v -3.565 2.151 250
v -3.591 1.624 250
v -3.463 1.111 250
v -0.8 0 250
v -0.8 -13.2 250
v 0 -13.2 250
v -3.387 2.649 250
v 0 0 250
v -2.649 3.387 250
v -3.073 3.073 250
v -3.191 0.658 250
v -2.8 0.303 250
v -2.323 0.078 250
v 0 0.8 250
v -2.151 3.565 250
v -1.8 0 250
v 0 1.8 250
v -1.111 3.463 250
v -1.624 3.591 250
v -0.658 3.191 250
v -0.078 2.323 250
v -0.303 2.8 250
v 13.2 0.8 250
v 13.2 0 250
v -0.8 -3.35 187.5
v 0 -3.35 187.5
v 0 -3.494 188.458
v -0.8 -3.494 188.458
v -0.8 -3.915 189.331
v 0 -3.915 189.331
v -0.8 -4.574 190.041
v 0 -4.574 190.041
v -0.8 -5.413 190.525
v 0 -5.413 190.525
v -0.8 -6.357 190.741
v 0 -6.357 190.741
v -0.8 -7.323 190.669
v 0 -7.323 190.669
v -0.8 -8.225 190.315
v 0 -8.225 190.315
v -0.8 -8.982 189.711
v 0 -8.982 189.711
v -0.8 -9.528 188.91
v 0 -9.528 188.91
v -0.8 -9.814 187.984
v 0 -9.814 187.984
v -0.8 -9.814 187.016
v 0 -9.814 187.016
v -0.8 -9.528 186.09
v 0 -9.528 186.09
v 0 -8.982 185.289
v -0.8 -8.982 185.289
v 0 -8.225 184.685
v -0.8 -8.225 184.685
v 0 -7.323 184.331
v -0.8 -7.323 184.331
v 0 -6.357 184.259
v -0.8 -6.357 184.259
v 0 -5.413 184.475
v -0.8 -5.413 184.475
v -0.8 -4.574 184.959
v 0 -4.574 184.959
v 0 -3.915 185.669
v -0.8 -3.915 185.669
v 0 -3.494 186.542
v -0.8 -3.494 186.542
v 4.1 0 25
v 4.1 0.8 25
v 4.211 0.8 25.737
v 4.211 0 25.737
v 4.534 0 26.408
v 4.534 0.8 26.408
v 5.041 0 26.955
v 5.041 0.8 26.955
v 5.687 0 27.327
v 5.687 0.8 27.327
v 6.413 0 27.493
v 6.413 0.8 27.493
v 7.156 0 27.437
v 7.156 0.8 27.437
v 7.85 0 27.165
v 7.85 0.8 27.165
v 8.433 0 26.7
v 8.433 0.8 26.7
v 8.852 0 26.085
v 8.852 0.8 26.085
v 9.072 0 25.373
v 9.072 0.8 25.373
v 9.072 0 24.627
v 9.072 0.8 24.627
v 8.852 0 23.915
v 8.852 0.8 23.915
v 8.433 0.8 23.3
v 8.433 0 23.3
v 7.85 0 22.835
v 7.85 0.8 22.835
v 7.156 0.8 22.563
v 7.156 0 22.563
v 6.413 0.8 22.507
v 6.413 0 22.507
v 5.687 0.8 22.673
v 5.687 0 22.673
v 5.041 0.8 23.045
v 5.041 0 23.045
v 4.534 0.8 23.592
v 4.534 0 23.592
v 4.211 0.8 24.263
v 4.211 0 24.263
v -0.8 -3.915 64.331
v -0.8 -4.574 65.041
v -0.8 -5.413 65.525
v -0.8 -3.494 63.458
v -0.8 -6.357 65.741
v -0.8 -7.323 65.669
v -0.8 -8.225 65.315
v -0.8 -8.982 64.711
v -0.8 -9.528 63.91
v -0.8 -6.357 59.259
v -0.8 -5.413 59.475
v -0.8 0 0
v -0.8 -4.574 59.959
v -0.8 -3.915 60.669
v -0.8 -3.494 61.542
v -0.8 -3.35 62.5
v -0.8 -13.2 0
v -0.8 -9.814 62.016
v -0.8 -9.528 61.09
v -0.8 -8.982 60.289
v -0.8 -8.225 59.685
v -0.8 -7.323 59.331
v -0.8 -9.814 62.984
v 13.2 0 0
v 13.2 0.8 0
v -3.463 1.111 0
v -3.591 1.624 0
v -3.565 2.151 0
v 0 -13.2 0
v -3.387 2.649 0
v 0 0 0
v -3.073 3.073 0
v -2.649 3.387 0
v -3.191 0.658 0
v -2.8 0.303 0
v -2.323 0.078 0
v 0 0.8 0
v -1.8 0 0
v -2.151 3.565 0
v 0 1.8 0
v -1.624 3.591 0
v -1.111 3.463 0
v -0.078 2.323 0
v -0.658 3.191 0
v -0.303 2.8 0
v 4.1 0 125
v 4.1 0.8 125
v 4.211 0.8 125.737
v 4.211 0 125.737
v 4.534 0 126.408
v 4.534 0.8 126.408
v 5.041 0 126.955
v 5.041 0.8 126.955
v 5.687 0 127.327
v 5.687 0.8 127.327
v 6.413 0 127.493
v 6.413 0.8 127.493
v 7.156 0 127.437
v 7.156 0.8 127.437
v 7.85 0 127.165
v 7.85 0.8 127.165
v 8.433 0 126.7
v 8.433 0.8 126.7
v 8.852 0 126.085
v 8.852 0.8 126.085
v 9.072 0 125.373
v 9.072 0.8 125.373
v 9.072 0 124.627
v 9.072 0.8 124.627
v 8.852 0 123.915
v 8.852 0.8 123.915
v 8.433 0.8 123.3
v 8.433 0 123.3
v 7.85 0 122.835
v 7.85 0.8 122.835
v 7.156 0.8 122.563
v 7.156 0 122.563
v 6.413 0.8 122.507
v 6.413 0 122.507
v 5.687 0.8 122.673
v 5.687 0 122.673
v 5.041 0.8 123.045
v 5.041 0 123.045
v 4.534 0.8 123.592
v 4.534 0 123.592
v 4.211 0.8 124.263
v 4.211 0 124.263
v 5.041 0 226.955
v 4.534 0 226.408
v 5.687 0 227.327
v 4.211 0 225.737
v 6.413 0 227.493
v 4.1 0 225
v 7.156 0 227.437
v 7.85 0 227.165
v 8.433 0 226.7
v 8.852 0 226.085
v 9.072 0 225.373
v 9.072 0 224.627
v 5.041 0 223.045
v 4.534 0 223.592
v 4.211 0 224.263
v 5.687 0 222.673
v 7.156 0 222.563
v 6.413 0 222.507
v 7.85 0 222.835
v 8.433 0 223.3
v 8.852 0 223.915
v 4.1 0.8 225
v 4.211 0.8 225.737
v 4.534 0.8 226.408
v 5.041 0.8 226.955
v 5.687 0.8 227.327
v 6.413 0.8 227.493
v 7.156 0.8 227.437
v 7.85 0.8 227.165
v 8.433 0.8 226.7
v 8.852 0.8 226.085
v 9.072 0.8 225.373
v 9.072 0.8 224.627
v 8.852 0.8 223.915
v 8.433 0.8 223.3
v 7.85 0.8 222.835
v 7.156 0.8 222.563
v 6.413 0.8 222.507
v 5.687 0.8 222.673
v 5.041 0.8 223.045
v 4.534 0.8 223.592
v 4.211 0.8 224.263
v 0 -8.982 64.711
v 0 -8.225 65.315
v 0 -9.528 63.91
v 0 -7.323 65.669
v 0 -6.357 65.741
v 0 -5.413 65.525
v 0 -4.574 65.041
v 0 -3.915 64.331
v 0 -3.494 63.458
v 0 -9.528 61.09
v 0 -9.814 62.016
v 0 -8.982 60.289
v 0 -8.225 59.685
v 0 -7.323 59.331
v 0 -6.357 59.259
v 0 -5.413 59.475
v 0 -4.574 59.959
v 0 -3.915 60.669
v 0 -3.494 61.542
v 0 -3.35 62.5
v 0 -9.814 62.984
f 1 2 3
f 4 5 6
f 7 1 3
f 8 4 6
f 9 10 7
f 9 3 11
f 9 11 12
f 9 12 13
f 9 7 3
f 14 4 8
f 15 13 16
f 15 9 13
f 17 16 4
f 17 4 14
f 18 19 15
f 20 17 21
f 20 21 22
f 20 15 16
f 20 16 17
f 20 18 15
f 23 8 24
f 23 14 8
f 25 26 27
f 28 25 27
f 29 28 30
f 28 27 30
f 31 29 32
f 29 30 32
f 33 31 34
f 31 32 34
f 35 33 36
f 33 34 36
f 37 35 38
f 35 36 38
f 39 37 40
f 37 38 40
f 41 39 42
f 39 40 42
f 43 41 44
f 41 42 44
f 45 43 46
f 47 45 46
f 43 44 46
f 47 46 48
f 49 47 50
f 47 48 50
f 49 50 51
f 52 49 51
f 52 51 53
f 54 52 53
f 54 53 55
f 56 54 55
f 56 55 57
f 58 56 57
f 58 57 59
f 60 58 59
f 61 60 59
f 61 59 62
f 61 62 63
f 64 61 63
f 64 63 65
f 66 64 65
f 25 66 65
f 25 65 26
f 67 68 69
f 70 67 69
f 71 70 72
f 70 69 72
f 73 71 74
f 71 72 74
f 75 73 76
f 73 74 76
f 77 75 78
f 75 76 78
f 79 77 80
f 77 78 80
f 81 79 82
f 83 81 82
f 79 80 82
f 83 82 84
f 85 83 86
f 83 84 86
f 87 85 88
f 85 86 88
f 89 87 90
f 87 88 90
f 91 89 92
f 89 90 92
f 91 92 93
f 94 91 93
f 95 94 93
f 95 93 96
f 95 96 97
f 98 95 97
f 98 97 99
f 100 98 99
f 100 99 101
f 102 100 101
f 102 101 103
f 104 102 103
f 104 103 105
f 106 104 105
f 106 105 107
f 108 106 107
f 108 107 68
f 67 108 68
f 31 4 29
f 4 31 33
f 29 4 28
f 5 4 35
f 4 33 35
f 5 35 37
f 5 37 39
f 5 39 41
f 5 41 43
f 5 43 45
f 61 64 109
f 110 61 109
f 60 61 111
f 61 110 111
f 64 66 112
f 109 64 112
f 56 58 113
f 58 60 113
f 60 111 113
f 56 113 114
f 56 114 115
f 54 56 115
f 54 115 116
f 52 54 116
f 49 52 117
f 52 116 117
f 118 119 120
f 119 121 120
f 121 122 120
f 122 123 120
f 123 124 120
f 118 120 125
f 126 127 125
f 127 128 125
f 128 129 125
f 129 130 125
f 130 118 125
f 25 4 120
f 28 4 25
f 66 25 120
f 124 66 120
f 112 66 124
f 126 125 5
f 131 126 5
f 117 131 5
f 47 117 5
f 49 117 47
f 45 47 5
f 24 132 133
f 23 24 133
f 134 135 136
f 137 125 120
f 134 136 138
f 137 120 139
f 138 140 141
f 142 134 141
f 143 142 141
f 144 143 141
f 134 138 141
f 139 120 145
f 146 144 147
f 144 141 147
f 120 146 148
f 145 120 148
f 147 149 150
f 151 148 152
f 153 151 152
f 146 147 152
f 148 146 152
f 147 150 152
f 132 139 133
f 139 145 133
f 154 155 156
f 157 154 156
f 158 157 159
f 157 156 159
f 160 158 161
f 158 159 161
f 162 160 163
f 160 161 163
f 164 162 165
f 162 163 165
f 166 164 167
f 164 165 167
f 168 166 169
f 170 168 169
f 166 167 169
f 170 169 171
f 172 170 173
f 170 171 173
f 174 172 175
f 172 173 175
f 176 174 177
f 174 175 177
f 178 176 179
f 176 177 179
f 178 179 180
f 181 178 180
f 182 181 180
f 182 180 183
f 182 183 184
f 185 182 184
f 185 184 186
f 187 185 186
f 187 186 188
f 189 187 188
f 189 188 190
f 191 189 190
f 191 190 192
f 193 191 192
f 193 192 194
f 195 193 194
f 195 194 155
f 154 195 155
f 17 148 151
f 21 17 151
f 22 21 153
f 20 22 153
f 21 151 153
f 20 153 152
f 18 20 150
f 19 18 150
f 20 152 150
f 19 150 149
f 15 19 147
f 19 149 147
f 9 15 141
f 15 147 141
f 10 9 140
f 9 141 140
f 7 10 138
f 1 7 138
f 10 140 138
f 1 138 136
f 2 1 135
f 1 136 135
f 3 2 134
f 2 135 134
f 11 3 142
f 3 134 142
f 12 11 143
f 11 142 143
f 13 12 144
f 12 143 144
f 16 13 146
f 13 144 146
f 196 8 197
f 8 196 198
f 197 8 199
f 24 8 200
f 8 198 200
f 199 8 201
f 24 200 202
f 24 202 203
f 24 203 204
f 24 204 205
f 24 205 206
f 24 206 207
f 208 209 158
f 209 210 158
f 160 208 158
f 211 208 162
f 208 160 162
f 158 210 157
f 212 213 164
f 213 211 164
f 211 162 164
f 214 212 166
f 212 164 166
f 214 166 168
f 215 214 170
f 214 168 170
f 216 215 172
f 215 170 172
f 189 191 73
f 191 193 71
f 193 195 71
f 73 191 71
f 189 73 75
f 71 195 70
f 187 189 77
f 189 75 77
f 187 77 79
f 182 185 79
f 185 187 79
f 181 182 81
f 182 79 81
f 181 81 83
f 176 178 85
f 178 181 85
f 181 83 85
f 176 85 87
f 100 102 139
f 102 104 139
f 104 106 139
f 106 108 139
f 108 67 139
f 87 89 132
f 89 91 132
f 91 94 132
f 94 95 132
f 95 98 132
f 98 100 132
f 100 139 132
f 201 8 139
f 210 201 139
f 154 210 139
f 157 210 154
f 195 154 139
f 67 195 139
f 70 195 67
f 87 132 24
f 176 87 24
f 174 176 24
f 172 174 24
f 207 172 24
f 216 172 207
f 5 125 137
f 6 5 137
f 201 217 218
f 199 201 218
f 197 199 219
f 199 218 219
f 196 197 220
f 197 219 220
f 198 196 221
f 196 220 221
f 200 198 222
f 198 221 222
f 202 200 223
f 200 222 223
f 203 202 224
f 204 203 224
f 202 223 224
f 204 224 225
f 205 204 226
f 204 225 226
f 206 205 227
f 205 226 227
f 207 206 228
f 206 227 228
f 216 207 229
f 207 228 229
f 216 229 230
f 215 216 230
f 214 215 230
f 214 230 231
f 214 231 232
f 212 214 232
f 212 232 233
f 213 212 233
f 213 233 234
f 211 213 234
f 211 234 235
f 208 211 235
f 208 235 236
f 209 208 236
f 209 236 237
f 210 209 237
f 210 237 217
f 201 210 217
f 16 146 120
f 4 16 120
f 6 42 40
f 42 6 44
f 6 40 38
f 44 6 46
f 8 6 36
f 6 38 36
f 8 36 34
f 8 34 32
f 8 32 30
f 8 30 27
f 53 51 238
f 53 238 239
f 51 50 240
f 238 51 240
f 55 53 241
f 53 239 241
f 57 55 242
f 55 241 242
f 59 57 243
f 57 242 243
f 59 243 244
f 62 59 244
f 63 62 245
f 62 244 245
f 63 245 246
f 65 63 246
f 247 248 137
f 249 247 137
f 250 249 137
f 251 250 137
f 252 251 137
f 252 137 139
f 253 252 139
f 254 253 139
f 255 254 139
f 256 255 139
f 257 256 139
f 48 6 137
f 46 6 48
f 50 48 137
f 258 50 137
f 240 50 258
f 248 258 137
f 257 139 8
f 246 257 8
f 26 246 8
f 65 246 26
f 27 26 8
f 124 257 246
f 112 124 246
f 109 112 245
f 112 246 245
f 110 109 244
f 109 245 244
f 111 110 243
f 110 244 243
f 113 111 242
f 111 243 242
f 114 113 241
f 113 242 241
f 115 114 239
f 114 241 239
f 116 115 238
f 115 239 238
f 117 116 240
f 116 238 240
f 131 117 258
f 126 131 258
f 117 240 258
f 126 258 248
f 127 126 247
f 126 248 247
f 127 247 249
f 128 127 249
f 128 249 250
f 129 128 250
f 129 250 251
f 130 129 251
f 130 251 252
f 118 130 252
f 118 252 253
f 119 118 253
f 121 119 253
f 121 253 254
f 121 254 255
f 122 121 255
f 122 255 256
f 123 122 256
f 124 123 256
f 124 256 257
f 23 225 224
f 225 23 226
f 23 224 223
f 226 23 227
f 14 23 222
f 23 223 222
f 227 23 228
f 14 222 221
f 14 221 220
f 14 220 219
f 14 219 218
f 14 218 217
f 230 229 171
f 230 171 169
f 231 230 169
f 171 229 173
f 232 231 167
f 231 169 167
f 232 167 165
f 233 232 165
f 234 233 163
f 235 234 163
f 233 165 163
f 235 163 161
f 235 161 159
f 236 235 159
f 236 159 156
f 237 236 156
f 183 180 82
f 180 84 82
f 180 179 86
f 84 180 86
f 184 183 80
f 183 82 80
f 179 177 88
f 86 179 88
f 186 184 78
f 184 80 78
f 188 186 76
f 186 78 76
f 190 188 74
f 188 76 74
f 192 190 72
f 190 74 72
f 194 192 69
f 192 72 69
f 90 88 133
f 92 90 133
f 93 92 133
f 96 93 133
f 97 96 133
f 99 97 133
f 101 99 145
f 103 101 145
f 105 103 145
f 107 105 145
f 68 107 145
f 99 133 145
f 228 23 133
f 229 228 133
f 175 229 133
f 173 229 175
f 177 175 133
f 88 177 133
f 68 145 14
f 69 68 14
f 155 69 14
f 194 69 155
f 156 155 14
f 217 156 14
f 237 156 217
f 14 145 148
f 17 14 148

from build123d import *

# Parameters (mm, degrees)
F1_DEPTH = 250
F2_R     = 2.5
F3_DEPTH = 14.001
F4_R     = 3.25
F5_DEPTH = 3.601


with BuildPart() as f1:
    # F0 (on Top) → F1 (new body)
    with BuildSketch(Plane.XY):
        with BuildLine():
            ThreePointArc((0, 1.8), (-3.072792, 3.072792), (-1.8, 0))
            ThreePointArc((-1.8, 0), (-0.527208, 0.527208), (0, 1.8))
        make_face()
        with BuildLine():
            Line((0, -13.2), (0, 0))
            Line((0, 0), (13.2, 0))
            Line((13.2, 0), (13.2, 0.8))
            Line((13.2, 0.8), (0, 0.8))
            Line((0, 0.8), (0, 1.8))
            ThreePointArc((0, 1.8), (-0.527208, 0.527208), (-1.8, 0))
            Line((-1.8, 0), (-0.8, 0))
            Line((-0.8, 0), (-0.8, -13.2))
            Line((-0.8, -13.2), (0, -13.2))
        make_face()
    extrude(amount=F1_DEPTH)

    # F2 (on face) → F3 (cut, through all)
    with BuildSketch(Plane(origin=(0, 0.8, 0), x_dir=(-1, 0, 0), z_dir=(0, 1, 0))):
        with Locations((-6.6, 25)):
            Circle(F2_R)
        with Locations((-6.6, 125)):
            Circle(F2_R)
        with Locations((-6.6, 225)):
            Circle(F2_R)
    extrude(amount=-F3_DEPTH, mode=Mode.SUBTRACT)

    # F4 (on face) → F5 (cut, through all)
    with BuildSketch(Plane.YZ):
        with Locations((-6.6, 187.5)):
            Circle(F4_R)
        with Locations((-6.6, 62.5)):
            Circle(F4_R)
    extrude(amount=-F5_DEPTH, mode=Mode.SUBTRACT)


solid = f1.part
